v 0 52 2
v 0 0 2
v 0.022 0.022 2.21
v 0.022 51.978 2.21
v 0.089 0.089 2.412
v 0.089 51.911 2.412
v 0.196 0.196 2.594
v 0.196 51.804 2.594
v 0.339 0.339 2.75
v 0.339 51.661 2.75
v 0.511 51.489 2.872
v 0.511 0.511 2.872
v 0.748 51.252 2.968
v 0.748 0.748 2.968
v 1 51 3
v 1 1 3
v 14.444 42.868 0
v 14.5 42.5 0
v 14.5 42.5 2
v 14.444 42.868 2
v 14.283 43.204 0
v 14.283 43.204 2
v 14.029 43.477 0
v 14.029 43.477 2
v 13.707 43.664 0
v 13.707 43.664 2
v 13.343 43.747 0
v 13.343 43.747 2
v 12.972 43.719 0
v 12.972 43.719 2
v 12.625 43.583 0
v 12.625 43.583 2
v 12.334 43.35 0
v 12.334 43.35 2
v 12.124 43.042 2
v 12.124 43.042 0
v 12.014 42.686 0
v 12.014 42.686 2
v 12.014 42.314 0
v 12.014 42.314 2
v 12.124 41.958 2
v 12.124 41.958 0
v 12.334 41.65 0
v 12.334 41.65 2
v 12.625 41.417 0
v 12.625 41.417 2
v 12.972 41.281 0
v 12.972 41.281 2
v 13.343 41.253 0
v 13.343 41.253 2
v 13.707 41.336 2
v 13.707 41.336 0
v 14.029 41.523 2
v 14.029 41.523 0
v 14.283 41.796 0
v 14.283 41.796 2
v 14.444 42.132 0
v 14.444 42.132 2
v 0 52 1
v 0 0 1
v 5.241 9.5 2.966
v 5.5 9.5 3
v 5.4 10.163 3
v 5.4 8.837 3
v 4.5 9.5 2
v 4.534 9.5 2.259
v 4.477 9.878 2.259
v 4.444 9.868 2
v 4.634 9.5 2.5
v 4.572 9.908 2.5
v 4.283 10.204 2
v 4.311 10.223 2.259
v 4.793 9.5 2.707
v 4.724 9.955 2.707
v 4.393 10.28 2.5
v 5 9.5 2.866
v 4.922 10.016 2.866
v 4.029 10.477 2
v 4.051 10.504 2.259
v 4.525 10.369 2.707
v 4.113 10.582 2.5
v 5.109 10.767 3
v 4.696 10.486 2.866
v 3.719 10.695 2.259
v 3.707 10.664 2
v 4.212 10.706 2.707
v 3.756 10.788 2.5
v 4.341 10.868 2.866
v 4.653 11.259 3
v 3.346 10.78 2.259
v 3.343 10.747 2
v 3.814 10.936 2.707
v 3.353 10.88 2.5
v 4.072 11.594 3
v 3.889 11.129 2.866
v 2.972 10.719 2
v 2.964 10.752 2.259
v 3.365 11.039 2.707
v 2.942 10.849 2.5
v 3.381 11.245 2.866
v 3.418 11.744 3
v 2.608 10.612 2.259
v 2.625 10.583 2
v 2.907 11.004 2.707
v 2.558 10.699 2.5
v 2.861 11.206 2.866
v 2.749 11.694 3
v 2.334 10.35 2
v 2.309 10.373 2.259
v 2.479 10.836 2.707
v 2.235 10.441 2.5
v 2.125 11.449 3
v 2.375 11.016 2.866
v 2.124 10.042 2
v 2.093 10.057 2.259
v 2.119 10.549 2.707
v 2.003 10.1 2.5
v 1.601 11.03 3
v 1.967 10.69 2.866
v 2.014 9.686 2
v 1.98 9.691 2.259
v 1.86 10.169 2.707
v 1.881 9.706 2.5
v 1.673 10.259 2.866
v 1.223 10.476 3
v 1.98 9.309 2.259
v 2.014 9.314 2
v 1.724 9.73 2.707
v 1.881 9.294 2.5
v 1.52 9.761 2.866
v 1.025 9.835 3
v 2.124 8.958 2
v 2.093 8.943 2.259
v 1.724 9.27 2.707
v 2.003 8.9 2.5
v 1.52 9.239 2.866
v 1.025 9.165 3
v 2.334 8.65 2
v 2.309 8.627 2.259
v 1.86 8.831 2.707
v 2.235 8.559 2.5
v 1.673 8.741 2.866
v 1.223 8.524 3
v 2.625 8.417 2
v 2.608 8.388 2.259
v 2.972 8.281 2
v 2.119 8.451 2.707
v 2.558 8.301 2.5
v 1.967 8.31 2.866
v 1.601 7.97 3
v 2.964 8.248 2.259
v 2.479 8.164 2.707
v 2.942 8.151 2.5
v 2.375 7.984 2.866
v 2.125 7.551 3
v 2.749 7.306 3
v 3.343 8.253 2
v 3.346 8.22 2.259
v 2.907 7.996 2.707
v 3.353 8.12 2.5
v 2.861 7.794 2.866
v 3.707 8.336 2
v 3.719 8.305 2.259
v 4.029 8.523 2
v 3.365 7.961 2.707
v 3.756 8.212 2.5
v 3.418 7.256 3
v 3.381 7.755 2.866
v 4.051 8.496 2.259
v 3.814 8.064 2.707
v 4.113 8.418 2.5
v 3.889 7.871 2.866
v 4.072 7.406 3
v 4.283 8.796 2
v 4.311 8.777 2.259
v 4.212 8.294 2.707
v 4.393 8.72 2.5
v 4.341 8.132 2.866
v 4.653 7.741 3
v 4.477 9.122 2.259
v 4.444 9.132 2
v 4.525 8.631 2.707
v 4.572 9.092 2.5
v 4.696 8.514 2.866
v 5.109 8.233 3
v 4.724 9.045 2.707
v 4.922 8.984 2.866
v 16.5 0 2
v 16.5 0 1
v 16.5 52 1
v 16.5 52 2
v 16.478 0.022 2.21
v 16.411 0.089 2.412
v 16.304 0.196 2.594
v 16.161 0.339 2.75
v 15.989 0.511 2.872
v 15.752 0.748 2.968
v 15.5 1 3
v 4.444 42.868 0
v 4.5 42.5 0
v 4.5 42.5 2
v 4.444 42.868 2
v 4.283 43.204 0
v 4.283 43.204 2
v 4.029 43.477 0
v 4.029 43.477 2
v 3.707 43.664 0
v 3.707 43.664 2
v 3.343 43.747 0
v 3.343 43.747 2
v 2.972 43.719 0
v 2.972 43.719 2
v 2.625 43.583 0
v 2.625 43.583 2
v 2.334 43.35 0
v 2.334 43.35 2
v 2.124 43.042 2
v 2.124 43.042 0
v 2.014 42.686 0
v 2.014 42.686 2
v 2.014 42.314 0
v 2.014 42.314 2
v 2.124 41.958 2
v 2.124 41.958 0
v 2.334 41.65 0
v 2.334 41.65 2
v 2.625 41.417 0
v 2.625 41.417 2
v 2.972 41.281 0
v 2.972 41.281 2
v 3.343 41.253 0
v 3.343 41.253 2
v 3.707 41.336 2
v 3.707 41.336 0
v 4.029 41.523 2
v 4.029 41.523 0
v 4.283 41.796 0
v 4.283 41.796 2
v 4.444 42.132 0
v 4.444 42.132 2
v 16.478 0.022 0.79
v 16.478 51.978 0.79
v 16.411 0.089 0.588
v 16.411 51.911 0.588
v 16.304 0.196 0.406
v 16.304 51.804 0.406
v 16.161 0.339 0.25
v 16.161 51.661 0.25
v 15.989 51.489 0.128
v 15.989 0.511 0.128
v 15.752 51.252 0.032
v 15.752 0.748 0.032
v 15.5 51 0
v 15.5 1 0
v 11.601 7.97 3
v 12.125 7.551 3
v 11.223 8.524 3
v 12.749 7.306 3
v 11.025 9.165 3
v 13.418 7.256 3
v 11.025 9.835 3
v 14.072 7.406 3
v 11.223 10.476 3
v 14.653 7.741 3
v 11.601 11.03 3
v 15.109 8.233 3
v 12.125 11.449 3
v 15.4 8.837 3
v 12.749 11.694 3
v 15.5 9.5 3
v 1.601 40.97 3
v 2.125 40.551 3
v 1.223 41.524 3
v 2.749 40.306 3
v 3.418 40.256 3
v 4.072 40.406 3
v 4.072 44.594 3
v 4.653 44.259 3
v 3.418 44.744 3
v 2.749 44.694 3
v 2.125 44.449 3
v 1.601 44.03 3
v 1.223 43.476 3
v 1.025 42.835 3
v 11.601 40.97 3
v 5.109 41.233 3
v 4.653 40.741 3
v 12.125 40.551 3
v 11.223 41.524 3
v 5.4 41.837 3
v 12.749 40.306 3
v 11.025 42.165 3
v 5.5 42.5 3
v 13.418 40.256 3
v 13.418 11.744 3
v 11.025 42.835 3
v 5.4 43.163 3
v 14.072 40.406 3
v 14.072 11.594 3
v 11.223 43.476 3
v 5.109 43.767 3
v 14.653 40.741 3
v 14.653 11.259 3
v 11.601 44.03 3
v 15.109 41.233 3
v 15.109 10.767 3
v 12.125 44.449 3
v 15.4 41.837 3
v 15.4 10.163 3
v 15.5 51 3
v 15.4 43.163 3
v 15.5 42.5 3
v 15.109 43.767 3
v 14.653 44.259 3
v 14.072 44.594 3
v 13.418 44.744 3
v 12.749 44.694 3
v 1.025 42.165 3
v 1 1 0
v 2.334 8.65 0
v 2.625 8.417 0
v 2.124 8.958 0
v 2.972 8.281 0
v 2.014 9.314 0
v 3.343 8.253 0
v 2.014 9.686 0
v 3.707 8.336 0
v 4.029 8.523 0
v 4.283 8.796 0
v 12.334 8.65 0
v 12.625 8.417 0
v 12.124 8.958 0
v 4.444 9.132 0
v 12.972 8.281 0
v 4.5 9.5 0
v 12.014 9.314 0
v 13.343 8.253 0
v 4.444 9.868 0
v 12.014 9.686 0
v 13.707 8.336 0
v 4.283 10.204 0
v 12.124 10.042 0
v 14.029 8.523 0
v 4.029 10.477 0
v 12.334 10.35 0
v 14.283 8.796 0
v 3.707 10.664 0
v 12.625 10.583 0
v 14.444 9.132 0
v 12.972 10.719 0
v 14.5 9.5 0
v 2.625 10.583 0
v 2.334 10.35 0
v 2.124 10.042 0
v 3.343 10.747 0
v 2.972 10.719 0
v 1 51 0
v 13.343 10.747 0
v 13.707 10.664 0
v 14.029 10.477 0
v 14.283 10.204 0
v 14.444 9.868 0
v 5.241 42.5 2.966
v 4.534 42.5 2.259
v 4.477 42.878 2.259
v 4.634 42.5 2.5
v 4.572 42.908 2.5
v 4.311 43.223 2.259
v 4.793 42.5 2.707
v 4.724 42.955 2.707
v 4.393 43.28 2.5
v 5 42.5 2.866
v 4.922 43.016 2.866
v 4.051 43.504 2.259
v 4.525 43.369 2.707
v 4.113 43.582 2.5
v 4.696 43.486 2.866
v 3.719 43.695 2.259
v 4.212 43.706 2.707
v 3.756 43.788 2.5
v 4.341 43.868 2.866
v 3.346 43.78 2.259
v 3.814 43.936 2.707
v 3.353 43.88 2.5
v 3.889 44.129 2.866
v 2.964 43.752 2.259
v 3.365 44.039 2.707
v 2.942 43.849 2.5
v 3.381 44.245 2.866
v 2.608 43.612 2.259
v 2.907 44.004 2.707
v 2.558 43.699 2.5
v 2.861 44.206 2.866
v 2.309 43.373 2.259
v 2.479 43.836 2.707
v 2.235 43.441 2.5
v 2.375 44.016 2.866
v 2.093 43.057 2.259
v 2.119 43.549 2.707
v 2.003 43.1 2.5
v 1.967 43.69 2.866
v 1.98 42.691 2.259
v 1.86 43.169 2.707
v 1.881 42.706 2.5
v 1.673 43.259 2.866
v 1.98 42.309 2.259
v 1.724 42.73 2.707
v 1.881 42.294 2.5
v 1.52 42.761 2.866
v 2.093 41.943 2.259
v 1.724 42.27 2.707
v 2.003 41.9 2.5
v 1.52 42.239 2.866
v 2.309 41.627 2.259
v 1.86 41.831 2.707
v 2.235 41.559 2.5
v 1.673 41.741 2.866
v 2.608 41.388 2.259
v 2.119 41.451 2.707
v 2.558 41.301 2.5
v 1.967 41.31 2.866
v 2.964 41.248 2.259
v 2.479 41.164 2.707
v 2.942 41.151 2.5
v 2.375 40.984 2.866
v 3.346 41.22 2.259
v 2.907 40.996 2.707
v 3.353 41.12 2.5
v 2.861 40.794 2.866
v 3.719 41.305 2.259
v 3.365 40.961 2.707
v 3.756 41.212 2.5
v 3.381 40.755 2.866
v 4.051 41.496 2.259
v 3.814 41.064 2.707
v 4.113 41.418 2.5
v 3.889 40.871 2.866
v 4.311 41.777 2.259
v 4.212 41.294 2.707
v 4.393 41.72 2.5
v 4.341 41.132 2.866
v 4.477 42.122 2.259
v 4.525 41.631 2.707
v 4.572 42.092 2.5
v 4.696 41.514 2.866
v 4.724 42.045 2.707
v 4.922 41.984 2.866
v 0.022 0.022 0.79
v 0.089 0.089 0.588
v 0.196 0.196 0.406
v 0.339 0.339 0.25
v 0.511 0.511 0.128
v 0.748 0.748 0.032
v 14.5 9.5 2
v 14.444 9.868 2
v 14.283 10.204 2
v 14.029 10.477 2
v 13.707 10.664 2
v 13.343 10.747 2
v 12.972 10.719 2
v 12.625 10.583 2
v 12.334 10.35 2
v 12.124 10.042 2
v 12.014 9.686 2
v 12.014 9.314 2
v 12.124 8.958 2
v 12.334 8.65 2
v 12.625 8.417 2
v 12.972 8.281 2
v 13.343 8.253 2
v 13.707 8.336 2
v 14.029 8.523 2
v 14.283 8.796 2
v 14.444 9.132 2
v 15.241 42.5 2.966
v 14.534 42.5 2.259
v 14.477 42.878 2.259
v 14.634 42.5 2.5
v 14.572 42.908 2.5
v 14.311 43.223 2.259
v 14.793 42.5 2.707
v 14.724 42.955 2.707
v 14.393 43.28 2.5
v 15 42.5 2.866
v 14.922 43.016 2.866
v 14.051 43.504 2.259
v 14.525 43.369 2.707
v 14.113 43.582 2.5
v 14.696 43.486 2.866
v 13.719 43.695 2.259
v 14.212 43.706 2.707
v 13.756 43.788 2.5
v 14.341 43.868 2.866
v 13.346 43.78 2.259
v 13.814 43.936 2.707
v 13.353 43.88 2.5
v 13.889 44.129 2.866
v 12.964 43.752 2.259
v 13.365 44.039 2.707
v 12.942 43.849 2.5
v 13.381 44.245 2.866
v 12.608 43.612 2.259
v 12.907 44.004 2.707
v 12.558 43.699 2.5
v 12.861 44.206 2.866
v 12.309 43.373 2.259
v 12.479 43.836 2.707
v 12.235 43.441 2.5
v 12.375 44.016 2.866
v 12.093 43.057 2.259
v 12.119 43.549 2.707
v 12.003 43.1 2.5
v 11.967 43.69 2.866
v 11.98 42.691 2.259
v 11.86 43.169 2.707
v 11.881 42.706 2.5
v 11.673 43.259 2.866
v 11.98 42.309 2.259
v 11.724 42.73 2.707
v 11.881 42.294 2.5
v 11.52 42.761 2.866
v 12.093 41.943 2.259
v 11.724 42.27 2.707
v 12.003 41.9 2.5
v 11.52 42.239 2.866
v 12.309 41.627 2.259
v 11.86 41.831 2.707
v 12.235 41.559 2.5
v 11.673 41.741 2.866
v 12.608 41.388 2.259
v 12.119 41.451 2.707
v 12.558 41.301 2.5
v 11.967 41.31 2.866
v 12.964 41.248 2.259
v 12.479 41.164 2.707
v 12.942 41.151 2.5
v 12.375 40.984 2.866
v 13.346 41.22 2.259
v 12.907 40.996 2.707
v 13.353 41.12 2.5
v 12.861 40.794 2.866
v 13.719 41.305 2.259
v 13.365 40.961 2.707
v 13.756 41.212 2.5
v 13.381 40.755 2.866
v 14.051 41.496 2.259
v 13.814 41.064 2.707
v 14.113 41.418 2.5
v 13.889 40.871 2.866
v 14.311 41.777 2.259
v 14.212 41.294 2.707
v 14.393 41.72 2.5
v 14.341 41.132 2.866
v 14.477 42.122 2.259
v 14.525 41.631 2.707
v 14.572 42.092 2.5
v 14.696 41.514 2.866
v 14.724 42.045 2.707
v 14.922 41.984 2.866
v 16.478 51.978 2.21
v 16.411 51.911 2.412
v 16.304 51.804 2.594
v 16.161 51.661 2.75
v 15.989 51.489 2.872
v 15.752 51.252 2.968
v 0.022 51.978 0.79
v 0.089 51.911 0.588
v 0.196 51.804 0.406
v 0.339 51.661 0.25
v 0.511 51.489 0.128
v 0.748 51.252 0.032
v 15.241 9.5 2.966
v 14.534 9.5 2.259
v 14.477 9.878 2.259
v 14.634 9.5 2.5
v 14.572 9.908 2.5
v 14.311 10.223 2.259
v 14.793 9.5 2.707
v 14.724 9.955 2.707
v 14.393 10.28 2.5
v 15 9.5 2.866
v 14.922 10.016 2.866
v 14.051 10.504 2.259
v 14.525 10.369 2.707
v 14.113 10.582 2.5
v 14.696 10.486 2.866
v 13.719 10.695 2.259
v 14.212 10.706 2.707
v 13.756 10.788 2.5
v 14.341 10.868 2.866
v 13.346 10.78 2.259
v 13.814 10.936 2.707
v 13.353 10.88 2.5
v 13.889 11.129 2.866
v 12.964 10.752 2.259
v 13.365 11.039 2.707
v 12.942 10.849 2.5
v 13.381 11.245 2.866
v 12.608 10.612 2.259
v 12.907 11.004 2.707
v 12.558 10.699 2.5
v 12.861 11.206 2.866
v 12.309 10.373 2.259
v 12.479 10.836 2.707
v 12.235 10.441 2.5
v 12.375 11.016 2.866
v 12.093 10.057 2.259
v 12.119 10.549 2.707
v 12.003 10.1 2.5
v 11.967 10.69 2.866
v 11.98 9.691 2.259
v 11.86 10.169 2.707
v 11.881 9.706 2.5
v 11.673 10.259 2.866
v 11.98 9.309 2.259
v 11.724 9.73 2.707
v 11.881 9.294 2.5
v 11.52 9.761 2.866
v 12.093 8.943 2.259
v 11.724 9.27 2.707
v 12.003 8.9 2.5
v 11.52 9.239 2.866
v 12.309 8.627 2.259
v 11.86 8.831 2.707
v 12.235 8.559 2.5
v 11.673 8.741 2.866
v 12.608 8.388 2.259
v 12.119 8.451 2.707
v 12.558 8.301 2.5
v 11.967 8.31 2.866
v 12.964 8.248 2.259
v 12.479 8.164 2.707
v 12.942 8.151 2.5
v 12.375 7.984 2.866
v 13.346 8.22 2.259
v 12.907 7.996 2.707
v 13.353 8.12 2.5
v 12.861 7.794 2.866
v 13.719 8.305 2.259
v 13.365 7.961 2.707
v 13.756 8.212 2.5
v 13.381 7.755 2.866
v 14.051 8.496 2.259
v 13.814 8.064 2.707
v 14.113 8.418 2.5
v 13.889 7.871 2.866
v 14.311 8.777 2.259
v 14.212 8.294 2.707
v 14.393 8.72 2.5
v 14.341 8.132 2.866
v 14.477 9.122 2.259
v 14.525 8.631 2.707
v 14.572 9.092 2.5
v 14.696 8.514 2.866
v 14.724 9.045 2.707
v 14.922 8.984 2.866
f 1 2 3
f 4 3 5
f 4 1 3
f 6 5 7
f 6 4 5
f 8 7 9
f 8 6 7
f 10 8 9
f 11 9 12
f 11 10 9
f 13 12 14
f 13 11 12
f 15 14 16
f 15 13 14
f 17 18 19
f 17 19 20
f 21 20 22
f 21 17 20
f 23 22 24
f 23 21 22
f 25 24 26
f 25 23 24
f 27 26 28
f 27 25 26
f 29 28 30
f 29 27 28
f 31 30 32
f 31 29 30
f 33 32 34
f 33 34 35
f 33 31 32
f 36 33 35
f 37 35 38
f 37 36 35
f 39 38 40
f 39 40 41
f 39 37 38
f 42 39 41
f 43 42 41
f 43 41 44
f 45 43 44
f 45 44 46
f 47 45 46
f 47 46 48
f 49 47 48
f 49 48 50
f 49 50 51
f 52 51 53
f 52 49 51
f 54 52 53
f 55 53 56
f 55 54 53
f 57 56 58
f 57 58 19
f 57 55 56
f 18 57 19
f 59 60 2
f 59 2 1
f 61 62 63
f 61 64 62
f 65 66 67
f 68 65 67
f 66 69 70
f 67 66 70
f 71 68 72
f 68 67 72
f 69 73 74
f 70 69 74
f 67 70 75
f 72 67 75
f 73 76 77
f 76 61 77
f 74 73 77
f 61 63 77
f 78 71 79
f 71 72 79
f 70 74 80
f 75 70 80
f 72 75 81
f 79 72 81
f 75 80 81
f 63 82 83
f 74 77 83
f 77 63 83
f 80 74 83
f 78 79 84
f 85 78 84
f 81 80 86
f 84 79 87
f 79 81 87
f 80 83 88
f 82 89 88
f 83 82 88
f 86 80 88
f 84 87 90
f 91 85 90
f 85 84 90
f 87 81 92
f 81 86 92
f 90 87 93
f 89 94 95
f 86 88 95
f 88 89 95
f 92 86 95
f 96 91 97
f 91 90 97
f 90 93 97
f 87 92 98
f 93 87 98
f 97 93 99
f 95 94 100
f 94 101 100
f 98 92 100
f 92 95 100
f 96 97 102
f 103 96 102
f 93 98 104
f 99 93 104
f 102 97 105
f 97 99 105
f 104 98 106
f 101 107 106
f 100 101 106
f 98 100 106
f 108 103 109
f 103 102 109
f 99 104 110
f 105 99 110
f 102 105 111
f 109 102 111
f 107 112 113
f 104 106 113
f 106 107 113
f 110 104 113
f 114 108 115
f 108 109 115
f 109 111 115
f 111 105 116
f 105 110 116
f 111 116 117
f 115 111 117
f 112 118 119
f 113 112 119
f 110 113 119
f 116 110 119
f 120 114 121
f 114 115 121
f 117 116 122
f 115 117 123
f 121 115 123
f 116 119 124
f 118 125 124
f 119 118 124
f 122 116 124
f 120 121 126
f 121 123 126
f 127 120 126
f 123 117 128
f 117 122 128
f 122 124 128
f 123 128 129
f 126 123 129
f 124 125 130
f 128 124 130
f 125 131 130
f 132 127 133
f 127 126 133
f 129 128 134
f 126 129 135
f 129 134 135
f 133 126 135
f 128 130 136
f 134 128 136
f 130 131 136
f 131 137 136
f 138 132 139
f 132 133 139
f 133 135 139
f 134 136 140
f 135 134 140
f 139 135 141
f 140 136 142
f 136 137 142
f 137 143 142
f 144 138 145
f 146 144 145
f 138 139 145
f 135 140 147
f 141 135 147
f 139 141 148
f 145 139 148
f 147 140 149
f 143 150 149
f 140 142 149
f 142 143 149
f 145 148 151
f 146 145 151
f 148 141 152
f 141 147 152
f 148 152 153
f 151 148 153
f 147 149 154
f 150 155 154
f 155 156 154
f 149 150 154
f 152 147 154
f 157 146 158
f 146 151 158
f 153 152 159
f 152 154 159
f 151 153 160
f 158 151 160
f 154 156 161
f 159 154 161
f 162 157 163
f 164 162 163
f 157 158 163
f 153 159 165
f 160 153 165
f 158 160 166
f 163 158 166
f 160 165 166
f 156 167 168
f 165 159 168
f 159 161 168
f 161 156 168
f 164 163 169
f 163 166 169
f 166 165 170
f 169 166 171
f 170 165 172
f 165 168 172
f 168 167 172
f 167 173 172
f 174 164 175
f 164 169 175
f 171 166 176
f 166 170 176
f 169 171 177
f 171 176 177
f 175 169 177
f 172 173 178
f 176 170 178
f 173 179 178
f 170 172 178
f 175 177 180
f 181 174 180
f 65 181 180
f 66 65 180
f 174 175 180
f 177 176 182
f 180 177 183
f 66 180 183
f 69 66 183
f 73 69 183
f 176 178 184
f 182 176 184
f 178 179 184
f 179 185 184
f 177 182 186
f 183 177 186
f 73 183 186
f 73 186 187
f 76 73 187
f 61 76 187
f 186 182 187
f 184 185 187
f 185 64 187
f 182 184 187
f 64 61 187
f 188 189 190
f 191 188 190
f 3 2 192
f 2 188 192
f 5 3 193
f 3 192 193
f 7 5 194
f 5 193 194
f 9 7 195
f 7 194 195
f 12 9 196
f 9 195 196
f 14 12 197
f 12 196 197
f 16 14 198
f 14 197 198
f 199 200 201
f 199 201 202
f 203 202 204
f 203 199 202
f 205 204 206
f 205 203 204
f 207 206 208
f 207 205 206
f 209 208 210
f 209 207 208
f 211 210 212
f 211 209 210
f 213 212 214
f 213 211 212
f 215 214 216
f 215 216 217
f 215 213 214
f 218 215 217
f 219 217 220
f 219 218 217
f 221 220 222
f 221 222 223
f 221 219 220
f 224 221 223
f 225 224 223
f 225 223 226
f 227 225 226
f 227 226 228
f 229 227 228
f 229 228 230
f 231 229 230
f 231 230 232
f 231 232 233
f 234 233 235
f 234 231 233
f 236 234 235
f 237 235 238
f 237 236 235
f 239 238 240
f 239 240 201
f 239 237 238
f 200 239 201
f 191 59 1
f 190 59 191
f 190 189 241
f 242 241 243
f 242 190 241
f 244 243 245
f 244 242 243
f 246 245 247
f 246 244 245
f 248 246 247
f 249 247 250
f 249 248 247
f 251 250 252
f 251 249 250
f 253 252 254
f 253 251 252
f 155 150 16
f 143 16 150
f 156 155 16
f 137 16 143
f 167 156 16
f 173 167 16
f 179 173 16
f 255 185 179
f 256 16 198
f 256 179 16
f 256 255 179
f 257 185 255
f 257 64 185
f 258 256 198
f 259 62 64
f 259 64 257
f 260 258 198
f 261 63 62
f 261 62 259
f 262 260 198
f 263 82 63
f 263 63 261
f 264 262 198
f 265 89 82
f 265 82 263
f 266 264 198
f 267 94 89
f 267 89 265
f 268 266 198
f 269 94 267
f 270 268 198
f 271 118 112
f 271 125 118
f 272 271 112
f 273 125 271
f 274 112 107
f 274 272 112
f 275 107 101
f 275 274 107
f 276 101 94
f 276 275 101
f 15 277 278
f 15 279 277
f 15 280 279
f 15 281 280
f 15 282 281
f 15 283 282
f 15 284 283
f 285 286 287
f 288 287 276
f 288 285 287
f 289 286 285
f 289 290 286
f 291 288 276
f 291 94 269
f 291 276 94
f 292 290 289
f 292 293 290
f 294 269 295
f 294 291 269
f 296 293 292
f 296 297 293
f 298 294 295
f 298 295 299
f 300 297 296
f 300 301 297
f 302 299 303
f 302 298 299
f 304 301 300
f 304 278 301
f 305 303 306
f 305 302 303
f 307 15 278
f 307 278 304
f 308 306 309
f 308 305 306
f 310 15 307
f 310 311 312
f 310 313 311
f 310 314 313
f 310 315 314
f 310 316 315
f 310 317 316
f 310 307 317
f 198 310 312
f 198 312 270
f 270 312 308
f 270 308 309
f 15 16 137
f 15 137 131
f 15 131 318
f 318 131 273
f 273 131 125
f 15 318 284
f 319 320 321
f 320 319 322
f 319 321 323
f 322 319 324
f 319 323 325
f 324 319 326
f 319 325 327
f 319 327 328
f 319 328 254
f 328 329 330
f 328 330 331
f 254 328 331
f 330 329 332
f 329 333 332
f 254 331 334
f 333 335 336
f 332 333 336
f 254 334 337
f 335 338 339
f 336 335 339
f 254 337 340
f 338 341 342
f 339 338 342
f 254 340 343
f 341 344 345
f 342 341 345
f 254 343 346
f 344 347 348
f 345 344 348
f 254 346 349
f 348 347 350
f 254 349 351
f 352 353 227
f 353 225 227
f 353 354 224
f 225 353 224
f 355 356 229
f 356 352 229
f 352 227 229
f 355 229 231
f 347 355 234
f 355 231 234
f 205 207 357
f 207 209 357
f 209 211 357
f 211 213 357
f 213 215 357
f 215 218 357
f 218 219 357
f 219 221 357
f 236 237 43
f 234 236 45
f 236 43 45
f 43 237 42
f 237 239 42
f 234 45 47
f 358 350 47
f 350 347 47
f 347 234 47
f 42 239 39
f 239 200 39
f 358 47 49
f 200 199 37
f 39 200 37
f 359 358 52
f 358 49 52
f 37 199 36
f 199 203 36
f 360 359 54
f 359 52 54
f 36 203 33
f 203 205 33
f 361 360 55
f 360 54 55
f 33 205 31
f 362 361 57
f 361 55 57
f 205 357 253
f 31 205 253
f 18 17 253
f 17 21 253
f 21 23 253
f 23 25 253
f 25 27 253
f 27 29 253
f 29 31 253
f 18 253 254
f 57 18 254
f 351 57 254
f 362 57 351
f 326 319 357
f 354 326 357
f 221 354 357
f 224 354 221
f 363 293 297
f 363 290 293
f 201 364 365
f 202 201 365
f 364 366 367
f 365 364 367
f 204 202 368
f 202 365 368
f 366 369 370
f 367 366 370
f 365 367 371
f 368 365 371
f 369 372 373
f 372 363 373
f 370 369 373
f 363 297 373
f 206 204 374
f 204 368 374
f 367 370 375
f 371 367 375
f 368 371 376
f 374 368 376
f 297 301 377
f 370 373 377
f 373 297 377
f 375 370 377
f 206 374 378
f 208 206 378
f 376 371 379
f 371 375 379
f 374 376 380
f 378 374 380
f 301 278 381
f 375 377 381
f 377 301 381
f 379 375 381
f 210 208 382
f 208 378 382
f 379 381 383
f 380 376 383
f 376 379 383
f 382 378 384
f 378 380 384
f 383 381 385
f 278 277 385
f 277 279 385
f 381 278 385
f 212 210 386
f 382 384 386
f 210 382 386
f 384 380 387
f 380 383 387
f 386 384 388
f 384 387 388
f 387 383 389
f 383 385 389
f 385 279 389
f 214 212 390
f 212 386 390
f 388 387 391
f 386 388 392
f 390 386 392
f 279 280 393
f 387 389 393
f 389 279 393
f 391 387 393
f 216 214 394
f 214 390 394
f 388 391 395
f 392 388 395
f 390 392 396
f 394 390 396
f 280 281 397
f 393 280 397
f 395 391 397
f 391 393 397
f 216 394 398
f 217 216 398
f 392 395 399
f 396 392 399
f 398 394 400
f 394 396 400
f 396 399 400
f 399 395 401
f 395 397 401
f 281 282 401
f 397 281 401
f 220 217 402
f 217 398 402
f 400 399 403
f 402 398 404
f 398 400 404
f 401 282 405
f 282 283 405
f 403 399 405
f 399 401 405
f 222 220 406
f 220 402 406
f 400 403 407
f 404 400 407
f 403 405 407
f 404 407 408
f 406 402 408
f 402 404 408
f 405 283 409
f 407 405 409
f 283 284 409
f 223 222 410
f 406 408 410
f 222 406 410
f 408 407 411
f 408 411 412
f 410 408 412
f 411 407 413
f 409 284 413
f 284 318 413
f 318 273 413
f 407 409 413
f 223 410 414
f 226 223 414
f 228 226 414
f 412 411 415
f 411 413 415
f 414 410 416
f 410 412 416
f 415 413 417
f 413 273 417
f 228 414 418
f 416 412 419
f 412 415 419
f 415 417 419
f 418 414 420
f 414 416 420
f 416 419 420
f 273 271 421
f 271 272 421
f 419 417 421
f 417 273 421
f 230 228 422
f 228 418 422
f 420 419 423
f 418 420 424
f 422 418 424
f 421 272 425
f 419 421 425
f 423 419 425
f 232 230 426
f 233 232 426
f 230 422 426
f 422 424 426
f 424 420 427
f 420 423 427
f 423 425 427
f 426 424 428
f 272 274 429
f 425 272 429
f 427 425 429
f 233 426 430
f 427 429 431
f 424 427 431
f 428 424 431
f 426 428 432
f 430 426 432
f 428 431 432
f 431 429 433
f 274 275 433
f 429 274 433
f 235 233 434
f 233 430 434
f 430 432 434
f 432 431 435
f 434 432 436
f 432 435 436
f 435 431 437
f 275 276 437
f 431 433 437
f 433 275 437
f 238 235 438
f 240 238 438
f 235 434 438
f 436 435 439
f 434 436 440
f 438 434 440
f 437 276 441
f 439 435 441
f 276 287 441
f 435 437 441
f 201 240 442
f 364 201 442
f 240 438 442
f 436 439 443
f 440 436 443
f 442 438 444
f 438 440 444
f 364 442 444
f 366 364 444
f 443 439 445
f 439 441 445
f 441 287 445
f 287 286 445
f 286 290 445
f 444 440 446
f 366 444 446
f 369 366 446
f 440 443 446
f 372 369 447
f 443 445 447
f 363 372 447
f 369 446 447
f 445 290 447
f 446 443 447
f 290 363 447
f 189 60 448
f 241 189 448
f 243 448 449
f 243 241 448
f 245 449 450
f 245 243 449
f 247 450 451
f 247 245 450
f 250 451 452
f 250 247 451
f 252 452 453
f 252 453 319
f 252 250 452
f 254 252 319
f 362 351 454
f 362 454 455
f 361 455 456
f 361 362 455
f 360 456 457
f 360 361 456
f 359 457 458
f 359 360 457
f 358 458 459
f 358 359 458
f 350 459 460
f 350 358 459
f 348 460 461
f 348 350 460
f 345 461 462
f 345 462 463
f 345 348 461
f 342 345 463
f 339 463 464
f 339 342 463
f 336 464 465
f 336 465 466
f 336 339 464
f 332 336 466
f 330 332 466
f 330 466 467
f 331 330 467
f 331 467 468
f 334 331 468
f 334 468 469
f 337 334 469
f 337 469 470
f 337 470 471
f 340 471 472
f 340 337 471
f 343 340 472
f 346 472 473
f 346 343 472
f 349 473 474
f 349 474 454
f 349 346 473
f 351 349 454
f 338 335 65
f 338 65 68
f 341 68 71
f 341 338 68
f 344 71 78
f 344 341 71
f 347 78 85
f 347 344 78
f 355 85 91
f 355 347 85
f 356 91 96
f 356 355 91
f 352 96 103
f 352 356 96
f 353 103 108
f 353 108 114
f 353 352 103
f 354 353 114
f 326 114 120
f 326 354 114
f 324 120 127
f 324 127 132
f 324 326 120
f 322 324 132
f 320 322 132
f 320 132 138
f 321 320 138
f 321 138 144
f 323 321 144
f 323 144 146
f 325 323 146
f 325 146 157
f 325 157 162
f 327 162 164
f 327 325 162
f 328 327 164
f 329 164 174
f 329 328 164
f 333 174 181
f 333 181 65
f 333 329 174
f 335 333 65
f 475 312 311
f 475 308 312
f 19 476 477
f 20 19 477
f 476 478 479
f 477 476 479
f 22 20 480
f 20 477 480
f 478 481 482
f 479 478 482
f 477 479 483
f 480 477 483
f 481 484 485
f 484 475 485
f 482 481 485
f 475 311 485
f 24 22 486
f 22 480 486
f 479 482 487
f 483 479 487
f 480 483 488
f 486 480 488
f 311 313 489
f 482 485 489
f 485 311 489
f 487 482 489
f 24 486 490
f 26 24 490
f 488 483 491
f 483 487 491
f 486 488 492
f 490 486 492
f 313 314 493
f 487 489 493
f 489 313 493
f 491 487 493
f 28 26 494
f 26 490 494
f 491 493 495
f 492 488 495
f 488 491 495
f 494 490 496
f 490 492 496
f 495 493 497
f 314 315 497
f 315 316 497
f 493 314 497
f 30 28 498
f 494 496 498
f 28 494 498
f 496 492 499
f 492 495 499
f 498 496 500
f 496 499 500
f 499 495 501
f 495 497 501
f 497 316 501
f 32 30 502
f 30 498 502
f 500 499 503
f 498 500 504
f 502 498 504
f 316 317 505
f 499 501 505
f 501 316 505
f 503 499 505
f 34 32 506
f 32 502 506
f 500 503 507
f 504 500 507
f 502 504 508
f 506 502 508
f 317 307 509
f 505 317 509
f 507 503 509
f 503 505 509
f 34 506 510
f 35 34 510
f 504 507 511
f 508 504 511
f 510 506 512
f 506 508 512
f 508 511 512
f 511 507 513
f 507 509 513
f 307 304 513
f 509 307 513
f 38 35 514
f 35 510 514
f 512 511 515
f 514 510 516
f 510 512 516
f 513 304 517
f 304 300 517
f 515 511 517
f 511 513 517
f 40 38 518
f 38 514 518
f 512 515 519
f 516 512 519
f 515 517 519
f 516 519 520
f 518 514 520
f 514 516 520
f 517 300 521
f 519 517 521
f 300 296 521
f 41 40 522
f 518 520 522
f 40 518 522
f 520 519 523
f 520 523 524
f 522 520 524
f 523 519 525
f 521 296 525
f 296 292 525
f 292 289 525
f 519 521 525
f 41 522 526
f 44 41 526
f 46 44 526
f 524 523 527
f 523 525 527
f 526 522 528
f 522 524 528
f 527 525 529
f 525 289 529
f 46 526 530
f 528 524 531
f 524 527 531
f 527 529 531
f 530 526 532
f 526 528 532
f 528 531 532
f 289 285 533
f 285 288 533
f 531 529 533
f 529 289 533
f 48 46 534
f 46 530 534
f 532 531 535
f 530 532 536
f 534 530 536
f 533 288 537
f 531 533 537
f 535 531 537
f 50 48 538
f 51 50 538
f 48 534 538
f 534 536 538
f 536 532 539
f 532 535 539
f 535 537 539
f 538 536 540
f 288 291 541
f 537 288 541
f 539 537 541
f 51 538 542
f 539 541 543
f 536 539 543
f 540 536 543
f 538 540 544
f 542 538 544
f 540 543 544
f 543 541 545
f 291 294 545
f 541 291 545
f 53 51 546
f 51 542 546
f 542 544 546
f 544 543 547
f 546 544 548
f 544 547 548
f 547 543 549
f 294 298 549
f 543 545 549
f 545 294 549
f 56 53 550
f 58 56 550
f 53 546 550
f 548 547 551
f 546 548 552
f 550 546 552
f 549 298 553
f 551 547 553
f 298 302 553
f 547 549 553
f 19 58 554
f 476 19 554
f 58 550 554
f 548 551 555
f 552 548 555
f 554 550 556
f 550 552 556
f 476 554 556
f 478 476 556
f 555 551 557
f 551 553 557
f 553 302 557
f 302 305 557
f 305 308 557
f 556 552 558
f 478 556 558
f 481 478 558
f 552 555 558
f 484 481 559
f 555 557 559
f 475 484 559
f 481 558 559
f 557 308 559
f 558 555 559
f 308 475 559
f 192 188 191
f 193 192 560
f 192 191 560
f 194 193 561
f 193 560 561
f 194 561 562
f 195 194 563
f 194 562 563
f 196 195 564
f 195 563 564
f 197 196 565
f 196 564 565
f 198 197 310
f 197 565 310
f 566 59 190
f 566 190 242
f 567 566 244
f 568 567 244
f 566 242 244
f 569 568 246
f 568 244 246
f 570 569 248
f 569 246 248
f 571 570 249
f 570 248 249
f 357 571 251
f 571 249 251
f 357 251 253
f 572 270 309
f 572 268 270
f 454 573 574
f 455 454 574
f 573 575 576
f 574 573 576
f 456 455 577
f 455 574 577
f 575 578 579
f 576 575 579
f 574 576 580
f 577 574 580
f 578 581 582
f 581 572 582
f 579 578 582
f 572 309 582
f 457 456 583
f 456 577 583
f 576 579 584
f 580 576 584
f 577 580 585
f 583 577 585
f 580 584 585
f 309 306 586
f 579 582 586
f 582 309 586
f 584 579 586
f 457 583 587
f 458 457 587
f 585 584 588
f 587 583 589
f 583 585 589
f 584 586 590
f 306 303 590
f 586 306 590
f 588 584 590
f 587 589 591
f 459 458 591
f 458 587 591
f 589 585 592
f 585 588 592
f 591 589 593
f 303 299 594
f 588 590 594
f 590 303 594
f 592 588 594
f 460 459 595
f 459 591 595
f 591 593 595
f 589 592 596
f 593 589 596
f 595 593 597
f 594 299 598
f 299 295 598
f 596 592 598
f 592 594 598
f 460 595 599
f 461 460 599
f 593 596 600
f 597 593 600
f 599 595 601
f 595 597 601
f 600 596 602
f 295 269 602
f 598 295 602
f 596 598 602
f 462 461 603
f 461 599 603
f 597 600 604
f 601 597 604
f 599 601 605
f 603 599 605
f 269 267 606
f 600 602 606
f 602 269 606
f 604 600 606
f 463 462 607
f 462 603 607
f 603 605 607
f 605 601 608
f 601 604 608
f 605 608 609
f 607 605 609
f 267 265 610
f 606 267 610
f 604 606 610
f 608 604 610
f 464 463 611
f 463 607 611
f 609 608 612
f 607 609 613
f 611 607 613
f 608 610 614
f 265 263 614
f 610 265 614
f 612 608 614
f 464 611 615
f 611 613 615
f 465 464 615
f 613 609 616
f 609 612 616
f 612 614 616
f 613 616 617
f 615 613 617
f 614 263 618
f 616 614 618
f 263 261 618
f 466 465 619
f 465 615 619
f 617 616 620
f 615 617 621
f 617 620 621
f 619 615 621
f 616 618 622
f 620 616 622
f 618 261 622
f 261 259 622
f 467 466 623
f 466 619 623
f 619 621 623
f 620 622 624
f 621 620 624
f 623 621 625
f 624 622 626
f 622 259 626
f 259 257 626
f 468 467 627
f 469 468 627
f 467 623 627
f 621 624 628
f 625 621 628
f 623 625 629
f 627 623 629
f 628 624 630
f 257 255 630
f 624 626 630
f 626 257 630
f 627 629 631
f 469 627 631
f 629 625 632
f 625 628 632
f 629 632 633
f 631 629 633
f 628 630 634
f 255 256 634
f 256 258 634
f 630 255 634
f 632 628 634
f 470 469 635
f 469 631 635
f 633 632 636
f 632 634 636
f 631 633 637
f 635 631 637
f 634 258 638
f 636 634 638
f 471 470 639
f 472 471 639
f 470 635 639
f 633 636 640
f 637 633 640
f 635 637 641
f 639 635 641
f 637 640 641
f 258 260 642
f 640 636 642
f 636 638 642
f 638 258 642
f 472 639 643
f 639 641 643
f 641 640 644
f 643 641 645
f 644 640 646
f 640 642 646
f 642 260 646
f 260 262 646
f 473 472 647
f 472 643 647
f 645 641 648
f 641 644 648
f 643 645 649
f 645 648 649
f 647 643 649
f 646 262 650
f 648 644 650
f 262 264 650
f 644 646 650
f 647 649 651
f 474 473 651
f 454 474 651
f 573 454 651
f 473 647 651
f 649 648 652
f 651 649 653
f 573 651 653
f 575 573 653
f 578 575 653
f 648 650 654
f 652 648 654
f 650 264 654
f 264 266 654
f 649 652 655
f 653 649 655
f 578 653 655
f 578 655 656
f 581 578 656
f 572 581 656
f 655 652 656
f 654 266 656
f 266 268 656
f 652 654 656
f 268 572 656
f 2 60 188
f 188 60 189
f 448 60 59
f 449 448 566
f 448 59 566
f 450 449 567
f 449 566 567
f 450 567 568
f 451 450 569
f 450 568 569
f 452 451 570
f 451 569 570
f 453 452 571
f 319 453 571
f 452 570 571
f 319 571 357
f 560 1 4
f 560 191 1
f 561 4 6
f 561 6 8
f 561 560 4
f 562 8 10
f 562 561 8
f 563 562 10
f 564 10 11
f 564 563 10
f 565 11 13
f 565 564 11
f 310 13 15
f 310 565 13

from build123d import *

# Parameters (mm, degrees)
F0_W     = 16.5
F0_H     = 52
F0_R     = 1.25
F1_DEPTH = 3
F2_R     = 0.99999


# Not quite as in the source:
# - a fillet or chamfer is up to 0.001 mm smaller than in the source, because OpenCascade refuses the exact size


with BuildPart() as f1:
    # F0 (on Top) → F1 (new body)
    with BuildSketch(Plane.XY):
        with Locations((8.25, 26)):
            Rectangle(F0_W, F0_H)
        with Locations((3.25, 9.5)):
            Circle(F0_R, mode=Mode.SUBTRACT)
        with Locations((13.25, 9.5)):
            Circle(F0_R, mode=Mode.SUBTRACT)
        with Locations((3.25, 42.5)):
            Circle(F0_R, mode=Mode.SUBTRACT)
        with Locations((13.25, 42.5)):
            Circle(F0_R, mode=Mode.SUBTRACT)
    extrude(amount=F1_DEPTH)

    # F2 (radius 1 in the source; OpenCascade refuses exactly that, so slightly less here)
    f2_edges = [f1.edges().sort_by_distance(p)[0] for p in [
        (16.5, 26, 3),
        (8.25, 52, 3),
        (0, 26, 3),
        (8.25, 0, 3),
        (2, 9.5, 3),
        (12, 9.5, 3),
        (2, 42.5, 3),
        (12, 42.5, 3),
        (16.5, 26, 0),
        (8.25, 52, 0),
        (0, 26, 0),
        (8.25, 0, 0),
    ]]
    fillet(f2_edges, radius=F2_R)


solid = f1.part
